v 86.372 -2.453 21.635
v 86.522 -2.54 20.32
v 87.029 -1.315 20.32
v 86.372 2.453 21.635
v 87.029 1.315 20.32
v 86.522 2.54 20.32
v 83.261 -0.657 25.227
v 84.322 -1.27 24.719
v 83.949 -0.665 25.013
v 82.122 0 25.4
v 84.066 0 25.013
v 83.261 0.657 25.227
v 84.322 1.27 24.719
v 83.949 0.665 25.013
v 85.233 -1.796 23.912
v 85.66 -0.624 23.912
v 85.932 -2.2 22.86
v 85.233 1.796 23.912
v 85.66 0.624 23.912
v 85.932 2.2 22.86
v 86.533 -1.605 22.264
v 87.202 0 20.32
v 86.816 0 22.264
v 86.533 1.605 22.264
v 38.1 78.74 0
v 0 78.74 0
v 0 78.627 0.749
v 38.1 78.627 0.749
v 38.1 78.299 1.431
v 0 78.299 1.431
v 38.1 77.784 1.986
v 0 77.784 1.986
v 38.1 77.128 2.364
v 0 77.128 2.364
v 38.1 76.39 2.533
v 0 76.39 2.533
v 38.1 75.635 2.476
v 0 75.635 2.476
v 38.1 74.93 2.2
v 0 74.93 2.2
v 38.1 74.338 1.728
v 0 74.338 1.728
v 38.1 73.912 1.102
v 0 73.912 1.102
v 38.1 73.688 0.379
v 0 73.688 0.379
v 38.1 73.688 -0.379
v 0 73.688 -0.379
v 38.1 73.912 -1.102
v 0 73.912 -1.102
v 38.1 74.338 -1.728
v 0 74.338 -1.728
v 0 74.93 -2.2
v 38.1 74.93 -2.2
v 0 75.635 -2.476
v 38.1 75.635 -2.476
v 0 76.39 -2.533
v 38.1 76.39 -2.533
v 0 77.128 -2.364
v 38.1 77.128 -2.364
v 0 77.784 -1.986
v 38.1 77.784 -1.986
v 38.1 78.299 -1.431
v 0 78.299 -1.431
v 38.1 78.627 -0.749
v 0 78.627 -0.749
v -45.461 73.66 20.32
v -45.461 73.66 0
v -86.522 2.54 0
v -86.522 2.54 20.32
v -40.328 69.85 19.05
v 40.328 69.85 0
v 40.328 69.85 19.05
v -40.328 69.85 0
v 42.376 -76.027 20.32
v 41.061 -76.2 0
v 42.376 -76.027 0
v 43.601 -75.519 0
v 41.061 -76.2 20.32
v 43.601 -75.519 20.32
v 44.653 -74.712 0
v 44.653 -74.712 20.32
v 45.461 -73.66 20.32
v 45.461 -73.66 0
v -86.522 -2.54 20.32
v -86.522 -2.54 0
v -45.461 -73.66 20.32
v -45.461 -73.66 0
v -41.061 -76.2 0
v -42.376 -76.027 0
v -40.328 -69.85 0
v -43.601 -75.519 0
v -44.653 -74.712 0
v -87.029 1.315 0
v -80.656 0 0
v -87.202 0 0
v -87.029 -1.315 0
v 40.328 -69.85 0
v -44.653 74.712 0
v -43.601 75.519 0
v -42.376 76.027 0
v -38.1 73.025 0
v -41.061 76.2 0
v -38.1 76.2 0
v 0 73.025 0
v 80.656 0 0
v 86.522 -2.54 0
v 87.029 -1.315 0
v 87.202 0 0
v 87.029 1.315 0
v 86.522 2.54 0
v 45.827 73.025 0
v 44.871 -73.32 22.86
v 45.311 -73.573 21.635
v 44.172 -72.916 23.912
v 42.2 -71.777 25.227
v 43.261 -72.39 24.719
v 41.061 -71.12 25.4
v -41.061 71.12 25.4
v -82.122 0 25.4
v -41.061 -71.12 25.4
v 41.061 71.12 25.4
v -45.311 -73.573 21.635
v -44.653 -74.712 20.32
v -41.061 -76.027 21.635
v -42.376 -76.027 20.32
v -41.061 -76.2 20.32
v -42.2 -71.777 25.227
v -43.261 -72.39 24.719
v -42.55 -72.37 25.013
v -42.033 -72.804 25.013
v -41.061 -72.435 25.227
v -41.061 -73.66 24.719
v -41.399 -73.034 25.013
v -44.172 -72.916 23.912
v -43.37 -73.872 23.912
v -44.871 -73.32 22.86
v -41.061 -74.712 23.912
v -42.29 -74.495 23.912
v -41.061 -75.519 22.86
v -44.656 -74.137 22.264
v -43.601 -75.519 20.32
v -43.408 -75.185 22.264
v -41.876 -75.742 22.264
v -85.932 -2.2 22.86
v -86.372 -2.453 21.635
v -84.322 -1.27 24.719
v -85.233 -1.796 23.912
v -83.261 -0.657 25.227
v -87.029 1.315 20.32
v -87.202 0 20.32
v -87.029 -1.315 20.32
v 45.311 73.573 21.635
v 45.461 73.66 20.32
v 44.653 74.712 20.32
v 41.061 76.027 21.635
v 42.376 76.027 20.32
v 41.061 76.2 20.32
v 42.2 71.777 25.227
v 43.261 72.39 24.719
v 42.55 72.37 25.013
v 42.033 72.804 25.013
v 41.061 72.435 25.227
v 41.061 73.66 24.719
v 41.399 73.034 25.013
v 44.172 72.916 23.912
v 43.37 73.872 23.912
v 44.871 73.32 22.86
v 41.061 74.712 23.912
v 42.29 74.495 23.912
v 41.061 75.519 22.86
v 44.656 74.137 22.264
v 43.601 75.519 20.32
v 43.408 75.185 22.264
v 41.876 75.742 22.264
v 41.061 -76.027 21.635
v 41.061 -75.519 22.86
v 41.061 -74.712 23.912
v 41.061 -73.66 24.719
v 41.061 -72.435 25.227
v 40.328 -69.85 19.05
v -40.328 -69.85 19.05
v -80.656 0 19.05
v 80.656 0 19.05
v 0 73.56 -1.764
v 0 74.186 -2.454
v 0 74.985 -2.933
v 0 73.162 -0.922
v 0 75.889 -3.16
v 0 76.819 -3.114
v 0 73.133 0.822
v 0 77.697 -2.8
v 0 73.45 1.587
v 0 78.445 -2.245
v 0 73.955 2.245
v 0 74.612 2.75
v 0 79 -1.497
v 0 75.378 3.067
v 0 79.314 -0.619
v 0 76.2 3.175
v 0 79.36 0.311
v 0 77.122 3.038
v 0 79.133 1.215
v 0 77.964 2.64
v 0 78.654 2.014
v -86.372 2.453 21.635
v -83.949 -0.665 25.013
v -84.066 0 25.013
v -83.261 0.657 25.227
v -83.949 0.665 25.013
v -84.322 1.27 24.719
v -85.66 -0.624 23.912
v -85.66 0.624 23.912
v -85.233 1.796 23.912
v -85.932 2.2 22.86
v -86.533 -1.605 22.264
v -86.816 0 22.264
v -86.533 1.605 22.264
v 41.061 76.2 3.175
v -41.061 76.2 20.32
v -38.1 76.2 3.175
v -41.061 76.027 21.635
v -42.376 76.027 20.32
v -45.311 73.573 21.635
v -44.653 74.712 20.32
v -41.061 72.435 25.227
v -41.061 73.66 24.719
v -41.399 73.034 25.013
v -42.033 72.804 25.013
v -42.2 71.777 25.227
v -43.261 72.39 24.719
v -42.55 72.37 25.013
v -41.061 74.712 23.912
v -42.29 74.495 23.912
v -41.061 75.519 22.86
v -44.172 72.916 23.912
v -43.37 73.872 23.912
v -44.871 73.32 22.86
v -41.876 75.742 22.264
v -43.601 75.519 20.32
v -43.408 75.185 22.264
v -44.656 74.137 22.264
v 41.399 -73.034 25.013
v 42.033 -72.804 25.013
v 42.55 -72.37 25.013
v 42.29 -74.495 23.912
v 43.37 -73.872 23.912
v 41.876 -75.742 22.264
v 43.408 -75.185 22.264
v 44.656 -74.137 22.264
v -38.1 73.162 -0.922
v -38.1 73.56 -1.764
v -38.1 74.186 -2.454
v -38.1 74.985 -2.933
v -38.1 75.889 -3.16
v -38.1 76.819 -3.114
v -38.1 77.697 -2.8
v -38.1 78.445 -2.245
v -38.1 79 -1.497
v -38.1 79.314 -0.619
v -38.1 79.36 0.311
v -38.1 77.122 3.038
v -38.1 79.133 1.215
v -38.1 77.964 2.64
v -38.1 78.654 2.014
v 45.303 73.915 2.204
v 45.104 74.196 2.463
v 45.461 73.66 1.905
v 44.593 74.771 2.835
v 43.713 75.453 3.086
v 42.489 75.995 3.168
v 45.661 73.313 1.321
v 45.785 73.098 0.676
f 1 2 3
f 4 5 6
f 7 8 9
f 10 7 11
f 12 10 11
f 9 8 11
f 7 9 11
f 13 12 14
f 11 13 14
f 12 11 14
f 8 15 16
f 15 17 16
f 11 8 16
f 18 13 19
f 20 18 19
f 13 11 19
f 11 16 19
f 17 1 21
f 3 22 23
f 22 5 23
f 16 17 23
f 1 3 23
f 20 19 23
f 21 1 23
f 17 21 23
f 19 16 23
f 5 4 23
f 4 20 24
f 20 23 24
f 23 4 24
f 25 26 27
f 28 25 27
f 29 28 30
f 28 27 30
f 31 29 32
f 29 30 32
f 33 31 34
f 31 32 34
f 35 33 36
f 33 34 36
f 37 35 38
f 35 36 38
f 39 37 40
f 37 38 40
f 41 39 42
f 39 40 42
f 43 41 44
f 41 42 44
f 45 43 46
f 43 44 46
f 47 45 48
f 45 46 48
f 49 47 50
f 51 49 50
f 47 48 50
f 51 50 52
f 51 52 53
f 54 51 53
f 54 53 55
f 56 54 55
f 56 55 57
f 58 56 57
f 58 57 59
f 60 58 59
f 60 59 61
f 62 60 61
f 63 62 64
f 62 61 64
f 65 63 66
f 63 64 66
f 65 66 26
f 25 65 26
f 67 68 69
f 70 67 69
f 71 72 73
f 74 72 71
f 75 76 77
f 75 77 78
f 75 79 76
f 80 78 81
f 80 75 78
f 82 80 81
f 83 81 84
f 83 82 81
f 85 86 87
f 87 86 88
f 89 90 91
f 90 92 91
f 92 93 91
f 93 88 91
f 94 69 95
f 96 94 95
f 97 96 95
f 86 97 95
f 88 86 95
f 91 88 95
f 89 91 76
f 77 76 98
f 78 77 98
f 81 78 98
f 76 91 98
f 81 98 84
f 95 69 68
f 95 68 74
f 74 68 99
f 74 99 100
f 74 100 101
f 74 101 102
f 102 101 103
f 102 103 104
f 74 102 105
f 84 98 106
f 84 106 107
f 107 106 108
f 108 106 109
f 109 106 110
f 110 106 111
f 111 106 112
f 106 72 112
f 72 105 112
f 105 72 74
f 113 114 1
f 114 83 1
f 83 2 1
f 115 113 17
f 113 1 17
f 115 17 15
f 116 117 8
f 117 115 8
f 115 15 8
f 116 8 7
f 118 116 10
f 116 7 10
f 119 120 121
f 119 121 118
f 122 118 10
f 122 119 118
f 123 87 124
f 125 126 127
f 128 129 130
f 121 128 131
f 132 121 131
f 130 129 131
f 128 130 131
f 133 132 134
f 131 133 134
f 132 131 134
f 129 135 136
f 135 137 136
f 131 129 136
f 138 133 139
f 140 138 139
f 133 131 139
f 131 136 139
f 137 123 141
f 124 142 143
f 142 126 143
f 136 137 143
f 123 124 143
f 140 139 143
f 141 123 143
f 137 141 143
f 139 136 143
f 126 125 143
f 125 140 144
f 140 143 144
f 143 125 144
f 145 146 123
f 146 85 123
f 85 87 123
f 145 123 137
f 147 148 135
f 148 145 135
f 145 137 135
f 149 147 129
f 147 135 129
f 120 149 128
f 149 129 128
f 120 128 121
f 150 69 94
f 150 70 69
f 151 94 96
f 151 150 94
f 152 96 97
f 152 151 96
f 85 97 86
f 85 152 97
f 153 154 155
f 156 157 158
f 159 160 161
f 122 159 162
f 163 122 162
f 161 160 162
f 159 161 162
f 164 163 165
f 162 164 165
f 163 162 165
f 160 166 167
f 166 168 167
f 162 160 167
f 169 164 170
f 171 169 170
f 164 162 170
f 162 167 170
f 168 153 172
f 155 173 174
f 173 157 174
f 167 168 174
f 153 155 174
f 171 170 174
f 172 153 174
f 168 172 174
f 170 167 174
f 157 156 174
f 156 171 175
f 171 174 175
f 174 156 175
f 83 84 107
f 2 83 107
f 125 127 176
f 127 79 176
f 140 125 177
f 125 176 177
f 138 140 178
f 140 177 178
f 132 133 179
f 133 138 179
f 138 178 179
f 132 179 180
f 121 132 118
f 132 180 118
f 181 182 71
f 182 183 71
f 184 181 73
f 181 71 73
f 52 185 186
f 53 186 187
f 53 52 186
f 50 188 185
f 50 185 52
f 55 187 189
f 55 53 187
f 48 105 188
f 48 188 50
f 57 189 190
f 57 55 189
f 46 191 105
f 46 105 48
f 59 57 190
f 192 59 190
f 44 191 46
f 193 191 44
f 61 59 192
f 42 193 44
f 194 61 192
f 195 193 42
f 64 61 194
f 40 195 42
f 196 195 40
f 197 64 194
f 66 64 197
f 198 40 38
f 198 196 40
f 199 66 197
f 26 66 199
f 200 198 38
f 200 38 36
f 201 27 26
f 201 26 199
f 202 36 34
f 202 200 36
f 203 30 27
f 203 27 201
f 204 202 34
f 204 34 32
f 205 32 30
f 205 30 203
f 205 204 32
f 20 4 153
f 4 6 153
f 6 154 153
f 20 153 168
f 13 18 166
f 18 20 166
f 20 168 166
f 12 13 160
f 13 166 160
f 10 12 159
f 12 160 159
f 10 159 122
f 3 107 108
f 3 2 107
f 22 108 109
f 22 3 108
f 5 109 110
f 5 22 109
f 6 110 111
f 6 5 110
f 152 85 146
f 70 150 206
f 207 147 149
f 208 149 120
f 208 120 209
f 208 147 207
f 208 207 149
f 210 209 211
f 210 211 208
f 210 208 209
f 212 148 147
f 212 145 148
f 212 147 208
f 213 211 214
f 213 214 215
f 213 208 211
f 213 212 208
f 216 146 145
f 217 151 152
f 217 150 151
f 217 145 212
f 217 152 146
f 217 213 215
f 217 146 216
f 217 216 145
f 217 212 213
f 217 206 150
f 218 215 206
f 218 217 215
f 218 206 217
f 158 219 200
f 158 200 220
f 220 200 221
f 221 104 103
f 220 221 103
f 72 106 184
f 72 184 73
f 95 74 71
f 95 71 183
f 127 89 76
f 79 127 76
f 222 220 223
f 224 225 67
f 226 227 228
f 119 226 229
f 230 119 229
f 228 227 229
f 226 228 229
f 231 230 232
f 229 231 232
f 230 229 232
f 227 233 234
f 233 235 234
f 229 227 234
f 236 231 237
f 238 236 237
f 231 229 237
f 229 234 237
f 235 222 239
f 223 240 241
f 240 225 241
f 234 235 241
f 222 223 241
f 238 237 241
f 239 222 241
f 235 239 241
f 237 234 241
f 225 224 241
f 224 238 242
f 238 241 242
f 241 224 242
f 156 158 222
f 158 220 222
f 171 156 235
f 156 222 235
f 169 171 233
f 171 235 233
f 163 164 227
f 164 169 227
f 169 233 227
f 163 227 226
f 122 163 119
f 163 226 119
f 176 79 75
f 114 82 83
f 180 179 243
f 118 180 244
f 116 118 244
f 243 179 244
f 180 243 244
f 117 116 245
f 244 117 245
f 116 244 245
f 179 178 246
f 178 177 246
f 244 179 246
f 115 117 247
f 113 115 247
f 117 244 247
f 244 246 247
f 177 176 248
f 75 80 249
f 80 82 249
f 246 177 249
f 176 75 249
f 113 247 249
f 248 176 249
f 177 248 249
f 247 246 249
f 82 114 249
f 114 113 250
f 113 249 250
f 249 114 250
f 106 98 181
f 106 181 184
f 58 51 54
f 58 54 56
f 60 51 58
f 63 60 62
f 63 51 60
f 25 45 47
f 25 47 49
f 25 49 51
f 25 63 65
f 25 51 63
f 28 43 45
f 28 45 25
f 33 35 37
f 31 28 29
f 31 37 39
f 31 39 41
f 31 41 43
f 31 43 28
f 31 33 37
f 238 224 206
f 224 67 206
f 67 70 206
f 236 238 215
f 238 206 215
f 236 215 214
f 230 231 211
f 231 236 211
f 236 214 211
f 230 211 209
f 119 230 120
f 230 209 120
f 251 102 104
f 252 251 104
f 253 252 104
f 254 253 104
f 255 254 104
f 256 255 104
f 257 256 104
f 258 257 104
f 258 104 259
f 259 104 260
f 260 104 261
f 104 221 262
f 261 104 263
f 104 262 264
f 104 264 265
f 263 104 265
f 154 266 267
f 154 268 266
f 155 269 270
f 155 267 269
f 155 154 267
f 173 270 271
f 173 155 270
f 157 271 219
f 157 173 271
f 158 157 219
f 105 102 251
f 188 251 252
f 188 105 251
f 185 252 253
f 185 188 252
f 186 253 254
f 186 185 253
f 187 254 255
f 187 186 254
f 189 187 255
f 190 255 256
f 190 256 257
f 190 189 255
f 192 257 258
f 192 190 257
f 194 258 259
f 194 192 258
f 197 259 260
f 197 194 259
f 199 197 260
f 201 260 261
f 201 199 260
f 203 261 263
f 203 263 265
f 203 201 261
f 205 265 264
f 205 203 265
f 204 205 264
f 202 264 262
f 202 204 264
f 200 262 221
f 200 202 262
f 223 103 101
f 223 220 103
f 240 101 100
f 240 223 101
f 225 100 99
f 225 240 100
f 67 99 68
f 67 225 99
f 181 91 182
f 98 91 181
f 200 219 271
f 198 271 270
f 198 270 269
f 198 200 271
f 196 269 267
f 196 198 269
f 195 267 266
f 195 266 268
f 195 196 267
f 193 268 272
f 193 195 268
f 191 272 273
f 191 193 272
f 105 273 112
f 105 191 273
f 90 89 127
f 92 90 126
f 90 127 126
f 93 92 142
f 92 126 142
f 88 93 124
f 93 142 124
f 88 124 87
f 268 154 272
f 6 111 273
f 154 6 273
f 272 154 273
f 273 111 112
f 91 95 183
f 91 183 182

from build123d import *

# Parameters (mm, degrees)
F1_DEPTH  = 25.4
F2_R      = 5.08
F3_T      = -6.35
F4_R      = 3.175
F5_DEPTH  = 38.1
F8_DEPTH  = 87.2033022895
F9_R      = 3.175
F10_DEPTH = 87.2033022895
F11_R     = 2.54
F12_DEPTH = 38.1


# Not quite as in the source:
# - the program builds the solid bodies; features that only make, move or delete a surface that nothing else refers to are left out


with BuildPart() as f1:
    # F0 (on Top) → F1 (new body)
    with BuildSketch(Plane.XY):
        Polygon((-43.9940905122, -76.2), (43.9940905122, -76.2), (87.9881810245, 0), (43.9940905122, 76.2), (-43.9940905122, 76.2), (-87.9881810245, 0), align=None)
    extrude(amount=F1_DEPTH)

    # F2
    f2_edges = [f1.edges().sort_by_distance(p)[0] for p in [
        (-65.991136, -38.1, 25.4),
        (0, -76.2, 25.4),
        (65.991136, -38.1, 25.4),
        (65.991136, 38.1, 25.4),
        (0, 76.2, 25.4),
        (-65.991136, 38.1, 25.4),
        (43.994091, -76.2, 12.7),
        (87.988181, 0, 12.7),
        (-43.994091, -76.2, 12.7),
        (43.994091, 76.2, 12.7),
        (-43.994091, 76.2, 12.7),
        (-87.988181, 0, 12.7),
    ]]
    fillet(f2_edges, radius=F2_R)

    # F3
    f3_openings = [f1.faces().sort_by_distance(p)[0] for p in [
        (0, 0, 0),
    ]]
    offset(amount=F3_T, openings=f3_openings)

    # F4 (on Right) → F5 (join)
    with BuildSketch(Plane.YZ):
        with Locations((76.2, 0)):
            Circle(F4_R)
    extrude(amount=-F5_DEPTH)

    # F8 (cut, through all): a face of the model
    f8_faces = [f1.faces().sort_by_distance(p)[0] for p in [
        (0, 76.6491706172, -0.4491706172),
    ]]
    extrude(f8_faces, amount=F8_DEPTH, mode=Mode.SUBTRACT)

    # F9 (on face) → F10 (cut, through all)
    with BuildSketch(Plane.YZ):
        with Locations((76.2, 0)):
            Circle(F9_R)
    extrude(amount=F10_DEPTH, mode=Mode.SUBTRACT)

    # F11 (on face) → F12 (join)
    with BuildSketch(Plane.YZ):
        with Locations((76.2, 0)):
            Circle(F11_R)
    extrude(amount=F12_DEPTH)


solid = f1.part
